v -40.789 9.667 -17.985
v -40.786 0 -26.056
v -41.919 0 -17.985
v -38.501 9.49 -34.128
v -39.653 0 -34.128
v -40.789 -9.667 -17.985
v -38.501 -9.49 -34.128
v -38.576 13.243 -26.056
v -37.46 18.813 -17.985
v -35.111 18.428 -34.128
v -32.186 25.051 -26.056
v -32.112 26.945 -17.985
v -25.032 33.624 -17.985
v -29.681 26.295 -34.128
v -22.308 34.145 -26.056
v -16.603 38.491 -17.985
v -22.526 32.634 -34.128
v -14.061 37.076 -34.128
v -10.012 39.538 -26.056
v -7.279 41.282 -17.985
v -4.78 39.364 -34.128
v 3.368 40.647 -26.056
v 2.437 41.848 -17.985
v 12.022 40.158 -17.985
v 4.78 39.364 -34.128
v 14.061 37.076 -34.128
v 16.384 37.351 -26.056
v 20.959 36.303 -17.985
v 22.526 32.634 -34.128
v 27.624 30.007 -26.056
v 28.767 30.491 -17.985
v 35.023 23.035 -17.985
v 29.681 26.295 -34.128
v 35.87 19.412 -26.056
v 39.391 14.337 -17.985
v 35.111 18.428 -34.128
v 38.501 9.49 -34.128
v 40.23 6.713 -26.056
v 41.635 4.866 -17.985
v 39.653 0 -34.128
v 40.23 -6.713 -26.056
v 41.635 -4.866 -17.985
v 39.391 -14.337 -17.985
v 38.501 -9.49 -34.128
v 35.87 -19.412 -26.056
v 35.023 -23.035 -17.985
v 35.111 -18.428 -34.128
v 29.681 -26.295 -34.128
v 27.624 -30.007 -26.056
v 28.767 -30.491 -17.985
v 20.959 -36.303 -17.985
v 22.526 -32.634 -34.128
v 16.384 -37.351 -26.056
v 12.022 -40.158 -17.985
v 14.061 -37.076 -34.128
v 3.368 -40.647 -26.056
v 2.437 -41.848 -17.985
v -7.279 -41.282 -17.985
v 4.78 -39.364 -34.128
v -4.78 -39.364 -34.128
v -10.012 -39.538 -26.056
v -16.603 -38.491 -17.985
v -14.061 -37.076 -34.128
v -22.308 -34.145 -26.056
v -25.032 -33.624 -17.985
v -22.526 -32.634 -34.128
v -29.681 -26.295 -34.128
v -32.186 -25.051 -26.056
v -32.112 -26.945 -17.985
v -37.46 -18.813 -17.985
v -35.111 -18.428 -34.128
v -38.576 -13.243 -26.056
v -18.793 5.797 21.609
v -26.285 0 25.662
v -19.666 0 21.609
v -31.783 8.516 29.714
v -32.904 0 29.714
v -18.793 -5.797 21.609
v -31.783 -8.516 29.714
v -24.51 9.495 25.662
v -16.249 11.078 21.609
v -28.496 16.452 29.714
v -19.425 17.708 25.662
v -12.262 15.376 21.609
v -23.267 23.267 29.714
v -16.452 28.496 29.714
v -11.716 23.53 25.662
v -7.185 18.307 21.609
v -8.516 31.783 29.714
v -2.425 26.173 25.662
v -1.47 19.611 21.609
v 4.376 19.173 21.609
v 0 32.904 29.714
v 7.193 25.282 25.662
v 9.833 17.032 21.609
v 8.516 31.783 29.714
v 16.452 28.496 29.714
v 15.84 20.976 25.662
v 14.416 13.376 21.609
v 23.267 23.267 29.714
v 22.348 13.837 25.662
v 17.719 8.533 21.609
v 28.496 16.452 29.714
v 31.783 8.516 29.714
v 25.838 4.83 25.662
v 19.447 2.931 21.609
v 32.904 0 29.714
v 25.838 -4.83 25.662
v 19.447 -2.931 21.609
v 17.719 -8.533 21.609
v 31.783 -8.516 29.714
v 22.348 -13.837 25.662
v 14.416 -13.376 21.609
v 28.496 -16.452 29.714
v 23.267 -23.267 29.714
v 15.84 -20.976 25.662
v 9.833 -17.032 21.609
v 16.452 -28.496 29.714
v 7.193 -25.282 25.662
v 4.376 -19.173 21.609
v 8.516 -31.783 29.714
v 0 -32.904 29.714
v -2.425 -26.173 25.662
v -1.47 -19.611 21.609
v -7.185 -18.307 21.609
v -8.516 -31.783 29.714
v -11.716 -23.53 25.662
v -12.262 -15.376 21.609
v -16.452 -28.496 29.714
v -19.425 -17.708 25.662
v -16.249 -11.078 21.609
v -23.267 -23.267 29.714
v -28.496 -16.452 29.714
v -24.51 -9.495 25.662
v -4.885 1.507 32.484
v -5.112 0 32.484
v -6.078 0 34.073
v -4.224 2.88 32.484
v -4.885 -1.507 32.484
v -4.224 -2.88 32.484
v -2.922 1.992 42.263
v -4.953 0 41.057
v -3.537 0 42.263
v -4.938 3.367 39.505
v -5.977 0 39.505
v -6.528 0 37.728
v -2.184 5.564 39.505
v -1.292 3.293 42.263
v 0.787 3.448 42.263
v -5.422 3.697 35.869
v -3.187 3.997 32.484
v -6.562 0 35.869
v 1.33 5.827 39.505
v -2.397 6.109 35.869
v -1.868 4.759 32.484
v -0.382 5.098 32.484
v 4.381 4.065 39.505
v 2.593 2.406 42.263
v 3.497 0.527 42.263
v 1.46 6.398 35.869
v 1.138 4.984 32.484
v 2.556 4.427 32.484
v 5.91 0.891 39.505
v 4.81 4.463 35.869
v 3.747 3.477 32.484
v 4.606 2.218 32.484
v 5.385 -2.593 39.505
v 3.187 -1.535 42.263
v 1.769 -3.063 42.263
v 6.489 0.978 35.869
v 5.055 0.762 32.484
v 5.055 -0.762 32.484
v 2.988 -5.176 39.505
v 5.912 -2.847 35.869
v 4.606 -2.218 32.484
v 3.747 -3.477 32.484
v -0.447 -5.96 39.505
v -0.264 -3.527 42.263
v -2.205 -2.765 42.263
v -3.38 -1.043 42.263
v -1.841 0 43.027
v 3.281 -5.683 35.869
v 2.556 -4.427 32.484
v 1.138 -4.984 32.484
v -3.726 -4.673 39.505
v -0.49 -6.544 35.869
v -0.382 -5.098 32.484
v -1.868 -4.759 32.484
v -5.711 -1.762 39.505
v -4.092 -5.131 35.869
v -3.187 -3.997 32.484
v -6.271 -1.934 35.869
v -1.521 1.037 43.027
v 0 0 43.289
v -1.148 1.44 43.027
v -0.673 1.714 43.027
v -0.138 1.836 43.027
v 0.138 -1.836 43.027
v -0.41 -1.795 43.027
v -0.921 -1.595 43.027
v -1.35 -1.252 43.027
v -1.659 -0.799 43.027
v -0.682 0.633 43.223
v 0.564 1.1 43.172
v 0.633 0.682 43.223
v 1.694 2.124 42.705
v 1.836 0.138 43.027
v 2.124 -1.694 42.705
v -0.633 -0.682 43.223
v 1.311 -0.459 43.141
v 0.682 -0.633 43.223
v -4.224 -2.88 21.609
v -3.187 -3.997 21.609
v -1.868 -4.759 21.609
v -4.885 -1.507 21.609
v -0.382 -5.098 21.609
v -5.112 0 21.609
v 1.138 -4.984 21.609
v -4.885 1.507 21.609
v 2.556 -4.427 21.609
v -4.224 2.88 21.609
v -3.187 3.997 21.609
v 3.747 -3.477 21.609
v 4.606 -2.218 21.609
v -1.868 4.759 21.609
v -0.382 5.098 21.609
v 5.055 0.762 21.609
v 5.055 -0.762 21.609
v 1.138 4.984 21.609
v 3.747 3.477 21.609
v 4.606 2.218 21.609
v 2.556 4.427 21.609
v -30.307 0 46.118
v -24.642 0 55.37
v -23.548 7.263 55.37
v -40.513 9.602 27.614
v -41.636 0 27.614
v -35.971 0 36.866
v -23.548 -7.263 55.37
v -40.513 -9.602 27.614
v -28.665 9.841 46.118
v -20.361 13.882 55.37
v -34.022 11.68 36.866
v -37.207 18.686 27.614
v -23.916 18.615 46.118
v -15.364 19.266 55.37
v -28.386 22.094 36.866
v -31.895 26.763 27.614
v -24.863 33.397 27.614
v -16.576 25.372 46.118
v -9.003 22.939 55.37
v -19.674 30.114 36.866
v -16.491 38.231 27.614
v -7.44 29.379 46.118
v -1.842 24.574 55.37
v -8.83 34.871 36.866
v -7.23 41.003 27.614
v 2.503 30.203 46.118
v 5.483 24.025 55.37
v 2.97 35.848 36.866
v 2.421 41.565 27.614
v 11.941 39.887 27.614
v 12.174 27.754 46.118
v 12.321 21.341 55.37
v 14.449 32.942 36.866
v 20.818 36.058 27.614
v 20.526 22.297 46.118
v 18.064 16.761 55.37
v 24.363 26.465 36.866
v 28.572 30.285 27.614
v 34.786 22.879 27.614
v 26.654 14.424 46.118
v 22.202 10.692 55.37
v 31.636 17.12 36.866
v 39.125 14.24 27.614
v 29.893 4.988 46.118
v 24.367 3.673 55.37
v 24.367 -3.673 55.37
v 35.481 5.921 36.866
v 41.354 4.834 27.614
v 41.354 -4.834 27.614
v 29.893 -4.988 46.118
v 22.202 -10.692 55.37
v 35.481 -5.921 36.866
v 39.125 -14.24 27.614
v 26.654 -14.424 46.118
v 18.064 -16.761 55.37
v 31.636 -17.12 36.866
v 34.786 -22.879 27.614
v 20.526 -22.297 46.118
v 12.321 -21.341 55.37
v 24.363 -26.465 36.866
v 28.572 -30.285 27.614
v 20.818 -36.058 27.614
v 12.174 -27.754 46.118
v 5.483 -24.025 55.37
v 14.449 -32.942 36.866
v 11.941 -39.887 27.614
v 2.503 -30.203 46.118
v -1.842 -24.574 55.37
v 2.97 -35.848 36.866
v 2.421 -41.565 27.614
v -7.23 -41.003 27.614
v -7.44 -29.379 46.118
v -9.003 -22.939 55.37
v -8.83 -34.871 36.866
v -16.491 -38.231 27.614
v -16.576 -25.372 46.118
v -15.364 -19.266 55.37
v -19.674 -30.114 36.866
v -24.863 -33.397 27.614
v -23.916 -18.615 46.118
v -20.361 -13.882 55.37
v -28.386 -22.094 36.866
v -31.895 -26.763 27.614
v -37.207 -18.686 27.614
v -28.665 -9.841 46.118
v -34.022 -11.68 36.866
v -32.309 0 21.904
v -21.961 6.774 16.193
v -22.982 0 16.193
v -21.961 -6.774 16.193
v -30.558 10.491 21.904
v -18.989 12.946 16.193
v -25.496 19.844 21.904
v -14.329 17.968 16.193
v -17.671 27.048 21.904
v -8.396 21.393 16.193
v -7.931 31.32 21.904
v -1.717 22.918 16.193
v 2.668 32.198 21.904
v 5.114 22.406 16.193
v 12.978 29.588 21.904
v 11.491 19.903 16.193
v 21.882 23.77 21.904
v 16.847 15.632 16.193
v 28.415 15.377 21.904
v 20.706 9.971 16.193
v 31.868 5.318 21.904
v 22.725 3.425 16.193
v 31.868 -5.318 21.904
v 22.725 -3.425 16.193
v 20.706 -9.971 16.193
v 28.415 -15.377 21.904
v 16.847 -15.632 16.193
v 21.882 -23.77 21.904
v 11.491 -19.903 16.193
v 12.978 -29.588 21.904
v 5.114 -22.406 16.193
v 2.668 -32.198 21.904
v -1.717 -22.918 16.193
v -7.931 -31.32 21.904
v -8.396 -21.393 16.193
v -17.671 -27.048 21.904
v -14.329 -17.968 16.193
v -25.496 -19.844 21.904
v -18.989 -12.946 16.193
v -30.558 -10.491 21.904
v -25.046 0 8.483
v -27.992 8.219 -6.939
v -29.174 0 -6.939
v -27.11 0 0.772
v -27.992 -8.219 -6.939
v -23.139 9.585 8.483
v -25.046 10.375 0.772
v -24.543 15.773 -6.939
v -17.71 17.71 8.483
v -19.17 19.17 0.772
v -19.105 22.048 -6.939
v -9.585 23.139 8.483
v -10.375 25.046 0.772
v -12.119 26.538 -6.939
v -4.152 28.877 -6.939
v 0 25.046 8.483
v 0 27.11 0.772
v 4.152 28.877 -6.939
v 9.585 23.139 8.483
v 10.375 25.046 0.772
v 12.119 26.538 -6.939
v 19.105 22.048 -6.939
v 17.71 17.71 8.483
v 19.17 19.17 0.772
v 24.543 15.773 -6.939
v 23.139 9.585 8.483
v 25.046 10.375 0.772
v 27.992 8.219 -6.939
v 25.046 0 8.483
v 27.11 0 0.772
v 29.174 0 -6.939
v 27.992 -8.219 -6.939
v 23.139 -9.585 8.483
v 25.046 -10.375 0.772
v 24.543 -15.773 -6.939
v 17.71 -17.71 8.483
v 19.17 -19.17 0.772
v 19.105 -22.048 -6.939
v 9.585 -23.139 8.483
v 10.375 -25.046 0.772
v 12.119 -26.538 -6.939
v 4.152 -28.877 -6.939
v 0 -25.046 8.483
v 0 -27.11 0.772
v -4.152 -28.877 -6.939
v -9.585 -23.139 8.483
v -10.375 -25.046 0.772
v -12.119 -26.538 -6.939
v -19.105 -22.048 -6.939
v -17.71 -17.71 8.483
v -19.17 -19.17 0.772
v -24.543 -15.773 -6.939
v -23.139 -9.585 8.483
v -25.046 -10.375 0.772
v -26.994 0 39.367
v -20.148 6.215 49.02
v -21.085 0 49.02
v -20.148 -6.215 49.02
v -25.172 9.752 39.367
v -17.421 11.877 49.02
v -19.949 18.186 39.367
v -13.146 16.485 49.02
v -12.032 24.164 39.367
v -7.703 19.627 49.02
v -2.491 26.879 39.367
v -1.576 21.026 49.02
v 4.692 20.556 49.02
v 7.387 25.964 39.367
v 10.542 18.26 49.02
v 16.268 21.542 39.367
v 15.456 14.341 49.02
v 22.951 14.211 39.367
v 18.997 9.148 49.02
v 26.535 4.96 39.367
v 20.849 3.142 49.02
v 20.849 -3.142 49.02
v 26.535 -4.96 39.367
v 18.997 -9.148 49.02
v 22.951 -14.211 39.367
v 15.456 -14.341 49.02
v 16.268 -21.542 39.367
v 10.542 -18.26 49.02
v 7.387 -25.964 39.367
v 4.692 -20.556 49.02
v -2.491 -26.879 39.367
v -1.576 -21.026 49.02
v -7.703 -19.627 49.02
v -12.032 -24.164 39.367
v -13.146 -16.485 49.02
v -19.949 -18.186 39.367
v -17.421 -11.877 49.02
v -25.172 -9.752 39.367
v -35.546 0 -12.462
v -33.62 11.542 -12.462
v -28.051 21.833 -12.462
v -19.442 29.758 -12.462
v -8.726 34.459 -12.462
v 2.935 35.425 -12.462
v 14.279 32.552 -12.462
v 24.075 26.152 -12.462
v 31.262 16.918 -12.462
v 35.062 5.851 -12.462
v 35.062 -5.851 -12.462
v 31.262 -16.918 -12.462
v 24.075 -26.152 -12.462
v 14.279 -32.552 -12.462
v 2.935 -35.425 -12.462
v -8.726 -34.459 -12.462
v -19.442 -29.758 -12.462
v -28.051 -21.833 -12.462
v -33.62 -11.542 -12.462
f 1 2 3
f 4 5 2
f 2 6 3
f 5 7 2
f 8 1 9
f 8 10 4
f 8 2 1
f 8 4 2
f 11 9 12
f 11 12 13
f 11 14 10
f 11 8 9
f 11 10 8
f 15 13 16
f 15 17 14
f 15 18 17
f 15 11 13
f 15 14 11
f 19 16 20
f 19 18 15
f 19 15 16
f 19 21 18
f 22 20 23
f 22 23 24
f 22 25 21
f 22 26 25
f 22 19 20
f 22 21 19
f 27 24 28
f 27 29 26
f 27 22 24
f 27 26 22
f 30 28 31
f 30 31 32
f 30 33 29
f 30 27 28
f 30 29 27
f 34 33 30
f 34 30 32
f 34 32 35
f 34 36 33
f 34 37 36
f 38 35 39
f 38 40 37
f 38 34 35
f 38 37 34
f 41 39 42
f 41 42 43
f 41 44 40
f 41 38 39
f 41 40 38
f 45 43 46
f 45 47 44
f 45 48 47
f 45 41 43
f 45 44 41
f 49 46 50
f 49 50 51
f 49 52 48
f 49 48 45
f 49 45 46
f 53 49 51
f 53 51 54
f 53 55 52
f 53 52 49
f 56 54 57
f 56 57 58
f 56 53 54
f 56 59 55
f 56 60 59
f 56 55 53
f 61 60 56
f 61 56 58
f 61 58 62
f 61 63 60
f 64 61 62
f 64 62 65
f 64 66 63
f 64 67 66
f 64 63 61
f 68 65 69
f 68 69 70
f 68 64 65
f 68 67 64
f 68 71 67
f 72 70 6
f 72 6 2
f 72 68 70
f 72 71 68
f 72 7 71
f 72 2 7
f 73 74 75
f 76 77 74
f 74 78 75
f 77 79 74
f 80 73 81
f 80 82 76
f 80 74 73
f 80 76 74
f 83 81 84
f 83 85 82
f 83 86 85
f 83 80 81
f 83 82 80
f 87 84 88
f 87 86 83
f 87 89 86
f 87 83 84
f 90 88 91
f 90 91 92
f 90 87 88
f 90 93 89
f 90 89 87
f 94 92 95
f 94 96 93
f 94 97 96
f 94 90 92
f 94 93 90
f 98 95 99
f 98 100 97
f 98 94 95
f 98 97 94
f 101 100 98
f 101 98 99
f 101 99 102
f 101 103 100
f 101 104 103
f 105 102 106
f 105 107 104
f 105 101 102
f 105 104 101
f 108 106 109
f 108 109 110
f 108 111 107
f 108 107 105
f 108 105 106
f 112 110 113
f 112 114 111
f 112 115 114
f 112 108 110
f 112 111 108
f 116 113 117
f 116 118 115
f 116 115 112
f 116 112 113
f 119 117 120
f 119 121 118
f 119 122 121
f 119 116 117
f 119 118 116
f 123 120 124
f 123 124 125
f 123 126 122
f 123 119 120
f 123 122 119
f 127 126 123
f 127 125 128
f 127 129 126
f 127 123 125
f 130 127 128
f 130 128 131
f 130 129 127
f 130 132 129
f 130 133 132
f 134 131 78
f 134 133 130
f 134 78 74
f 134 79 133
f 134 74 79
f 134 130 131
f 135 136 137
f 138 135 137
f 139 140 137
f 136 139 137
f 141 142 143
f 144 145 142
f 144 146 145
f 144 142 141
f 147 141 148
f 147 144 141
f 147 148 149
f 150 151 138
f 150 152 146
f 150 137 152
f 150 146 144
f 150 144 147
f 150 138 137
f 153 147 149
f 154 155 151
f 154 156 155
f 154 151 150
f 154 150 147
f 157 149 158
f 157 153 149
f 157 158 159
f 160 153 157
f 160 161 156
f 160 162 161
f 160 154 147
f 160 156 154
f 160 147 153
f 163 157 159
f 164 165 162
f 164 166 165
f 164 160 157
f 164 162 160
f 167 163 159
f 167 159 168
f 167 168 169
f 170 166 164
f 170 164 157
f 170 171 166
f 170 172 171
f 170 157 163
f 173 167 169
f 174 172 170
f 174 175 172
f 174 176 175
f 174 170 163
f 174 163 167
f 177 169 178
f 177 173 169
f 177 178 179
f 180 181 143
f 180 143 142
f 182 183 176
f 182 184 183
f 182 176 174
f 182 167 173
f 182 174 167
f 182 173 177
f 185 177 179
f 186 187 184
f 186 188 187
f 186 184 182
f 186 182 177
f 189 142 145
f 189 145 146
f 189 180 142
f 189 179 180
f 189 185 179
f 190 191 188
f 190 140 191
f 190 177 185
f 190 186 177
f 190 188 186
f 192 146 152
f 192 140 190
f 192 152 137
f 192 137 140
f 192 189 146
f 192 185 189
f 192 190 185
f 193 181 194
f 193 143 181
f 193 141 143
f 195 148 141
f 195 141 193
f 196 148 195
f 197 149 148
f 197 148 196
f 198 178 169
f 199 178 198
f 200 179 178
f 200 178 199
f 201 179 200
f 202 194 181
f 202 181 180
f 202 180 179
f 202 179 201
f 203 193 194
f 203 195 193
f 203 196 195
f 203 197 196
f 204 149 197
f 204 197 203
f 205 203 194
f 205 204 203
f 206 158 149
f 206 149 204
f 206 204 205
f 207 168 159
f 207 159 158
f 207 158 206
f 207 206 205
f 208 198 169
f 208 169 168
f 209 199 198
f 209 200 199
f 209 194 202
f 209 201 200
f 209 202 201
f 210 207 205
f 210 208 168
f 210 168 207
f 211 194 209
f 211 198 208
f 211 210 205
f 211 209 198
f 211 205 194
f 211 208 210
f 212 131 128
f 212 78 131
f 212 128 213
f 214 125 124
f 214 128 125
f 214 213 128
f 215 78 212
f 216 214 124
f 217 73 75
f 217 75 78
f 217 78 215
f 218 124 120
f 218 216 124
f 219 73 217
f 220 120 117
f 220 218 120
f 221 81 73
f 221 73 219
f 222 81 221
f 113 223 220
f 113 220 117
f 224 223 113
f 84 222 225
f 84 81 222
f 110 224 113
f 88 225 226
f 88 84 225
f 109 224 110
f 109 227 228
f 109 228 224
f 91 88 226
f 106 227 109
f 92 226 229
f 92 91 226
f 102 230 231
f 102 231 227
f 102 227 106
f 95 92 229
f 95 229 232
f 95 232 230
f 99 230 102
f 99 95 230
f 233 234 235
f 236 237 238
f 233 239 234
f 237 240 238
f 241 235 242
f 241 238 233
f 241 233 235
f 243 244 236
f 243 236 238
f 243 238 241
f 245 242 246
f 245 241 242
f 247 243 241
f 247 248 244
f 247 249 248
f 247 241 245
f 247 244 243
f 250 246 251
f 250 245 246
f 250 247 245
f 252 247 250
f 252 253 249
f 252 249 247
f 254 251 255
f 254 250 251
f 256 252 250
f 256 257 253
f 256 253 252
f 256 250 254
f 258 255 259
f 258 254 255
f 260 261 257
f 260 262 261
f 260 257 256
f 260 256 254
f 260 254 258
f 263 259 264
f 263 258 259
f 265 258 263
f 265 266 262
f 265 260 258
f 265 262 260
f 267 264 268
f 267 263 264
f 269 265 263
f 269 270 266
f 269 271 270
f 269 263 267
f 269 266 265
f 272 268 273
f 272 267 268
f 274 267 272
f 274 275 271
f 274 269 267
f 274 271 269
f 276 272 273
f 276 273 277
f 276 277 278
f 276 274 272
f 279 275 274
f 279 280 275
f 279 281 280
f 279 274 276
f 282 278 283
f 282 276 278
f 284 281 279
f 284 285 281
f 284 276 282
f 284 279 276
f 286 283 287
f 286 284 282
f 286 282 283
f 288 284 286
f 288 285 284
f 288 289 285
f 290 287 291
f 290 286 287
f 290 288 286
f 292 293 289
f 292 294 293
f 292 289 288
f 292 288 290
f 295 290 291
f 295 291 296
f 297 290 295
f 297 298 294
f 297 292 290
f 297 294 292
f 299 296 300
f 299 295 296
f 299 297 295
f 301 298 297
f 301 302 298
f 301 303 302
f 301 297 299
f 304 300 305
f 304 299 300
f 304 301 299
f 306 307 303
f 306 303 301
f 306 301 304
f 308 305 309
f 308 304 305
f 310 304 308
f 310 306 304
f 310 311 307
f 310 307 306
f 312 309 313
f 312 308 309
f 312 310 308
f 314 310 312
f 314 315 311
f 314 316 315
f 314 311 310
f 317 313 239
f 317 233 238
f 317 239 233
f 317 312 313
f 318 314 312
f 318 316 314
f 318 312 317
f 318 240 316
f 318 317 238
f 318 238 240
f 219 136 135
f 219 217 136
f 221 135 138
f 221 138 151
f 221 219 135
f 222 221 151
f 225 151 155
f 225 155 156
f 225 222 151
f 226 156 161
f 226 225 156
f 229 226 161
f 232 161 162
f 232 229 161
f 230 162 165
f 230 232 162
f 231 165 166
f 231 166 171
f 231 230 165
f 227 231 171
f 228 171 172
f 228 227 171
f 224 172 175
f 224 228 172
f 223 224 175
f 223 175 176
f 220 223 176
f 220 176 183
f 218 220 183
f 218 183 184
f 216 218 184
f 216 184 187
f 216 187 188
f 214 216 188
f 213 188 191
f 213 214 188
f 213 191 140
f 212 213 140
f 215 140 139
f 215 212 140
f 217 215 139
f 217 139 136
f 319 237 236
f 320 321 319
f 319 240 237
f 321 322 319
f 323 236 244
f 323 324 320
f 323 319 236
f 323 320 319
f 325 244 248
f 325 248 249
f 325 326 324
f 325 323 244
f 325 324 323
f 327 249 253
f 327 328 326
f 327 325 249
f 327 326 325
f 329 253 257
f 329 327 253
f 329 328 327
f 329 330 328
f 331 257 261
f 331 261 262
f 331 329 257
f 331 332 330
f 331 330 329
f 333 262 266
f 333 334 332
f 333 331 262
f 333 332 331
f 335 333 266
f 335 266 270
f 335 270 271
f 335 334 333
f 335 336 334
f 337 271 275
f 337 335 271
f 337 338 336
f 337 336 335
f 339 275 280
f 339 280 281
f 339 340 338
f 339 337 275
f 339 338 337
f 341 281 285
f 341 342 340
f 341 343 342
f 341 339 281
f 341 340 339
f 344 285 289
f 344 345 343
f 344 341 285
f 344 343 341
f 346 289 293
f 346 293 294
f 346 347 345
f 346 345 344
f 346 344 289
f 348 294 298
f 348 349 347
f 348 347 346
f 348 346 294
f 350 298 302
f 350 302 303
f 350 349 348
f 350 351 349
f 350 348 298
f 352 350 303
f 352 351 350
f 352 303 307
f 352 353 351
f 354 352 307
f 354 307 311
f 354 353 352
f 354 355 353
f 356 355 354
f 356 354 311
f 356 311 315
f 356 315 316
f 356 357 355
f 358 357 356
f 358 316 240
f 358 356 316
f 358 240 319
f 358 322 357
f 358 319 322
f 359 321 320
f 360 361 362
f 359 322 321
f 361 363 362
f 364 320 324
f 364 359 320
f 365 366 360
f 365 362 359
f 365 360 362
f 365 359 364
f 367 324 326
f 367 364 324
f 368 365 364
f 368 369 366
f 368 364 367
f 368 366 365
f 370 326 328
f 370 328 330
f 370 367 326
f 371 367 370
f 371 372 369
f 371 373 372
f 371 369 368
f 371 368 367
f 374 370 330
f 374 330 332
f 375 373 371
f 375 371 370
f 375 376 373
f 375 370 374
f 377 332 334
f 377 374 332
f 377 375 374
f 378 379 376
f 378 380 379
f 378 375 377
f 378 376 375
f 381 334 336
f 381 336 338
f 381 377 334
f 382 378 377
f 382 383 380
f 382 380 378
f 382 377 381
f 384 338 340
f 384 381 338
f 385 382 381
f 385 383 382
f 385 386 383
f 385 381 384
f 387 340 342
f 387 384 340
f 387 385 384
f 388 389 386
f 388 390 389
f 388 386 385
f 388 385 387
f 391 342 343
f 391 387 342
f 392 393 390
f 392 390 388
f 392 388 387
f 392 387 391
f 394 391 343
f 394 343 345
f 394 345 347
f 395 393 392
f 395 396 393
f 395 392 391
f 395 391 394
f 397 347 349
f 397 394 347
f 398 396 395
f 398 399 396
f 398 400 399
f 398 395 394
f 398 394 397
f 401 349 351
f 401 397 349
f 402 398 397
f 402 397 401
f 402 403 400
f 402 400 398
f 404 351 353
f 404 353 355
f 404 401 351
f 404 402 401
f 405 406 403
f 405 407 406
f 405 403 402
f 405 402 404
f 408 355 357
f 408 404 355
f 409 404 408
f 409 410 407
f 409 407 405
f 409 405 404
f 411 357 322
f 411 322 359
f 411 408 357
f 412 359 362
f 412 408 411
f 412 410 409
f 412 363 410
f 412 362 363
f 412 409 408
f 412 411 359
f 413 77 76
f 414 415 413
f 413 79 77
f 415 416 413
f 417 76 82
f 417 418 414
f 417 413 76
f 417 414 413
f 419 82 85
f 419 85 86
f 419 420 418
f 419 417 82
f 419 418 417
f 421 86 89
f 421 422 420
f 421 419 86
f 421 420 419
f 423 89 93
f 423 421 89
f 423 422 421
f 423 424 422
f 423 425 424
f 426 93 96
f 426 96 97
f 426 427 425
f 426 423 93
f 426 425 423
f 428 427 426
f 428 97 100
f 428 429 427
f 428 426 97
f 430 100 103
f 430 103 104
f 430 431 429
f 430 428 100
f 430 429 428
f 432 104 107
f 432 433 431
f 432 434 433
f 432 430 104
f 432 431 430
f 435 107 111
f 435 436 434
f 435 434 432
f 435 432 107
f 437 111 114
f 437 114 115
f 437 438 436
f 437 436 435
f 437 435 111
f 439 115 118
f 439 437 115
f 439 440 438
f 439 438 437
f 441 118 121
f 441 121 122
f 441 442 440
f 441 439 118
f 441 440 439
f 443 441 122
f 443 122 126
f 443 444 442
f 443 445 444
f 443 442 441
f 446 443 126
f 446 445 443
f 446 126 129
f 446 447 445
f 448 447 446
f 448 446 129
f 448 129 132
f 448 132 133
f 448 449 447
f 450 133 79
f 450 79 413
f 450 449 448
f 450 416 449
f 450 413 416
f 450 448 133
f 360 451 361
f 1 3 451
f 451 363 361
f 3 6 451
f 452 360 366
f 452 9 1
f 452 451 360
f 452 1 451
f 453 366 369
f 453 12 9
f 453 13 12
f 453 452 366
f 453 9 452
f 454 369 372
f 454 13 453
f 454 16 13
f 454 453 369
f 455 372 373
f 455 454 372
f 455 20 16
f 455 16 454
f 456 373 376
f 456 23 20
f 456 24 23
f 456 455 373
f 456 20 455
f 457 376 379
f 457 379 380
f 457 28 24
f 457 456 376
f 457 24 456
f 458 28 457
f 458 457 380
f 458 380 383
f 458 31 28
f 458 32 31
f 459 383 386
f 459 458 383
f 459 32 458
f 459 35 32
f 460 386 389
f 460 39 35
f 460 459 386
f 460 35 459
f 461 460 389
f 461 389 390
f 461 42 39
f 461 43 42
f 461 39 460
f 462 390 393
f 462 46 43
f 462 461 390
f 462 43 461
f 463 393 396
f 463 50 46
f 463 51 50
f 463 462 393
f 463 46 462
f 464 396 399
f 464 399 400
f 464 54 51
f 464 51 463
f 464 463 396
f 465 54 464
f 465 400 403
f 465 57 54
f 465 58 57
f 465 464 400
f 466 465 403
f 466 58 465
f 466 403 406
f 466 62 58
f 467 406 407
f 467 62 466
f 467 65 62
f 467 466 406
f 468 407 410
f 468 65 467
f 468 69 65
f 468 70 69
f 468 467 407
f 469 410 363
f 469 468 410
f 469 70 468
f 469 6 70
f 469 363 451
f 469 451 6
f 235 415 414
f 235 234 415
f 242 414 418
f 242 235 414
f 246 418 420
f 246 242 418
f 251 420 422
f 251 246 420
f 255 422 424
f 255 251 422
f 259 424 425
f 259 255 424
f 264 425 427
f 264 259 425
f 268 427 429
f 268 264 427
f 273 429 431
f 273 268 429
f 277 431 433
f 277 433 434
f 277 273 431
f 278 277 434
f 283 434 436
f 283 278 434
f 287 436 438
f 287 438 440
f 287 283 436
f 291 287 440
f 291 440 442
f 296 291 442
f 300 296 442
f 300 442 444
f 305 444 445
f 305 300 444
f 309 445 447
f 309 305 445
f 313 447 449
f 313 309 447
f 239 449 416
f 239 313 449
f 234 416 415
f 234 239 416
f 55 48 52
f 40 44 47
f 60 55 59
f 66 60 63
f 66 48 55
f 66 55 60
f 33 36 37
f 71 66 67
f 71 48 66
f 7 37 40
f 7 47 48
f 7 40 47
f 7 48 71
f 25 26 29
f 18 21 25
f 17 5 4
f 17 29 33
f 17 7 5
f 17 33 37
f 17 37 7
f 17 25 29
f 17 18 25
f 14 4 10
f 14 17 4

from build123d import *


with BuildPart() as f1:
    # F0 (on Front) → F1 (revolve)
    with BuildSketch(Plane.XZ):
        Polygon((-21.084563, 49.019749), (-24.64242, 55.369749), (-41.635697, 27.61407), (-22.981961, 16.193413), (-29.173962, -6.938921), (0, -6.089257), (0, 13.73623), (0, 21.609018), (-5.112027, 21.609018), (-19.666283, 21.609018), (-32.904414, 29.713998), align=None)
        with BuildLine():
            Line((-5.112027, 32.483828), (-5.112027, 21.609018))
            Line((-5.112027, 21.609018), (0, 21.609018))
            Line((0, 21.609018), (0, 30.065285))
            ThreePointArc((0, 30.065285), (-2.827639, 30.700427), (-5.112027, 32.483828))
        make_face()
        with BuildLine():
            ThreePointArc((0, 43.289019), (-5.976725, 39.504791), (-5.112027, 32.483828))
            ThreePointArc((-5.112027, 32.483828), (-2.827639, 30.700427), (0, 30.065285))
            Line((0, 30.065285), (0, 43.289019))
        make_face()
        Polygon((0, -6.089257), (-29.173962, -6.938921), (-41.918916, -17.984549), (-39.653149, -34.12816), (0, -34.12816), (0, -18.245815), align=None)
    revolve(axis=Axis((0, 0, 3.823487), (0, 0, -1)))


solid = f1.part
